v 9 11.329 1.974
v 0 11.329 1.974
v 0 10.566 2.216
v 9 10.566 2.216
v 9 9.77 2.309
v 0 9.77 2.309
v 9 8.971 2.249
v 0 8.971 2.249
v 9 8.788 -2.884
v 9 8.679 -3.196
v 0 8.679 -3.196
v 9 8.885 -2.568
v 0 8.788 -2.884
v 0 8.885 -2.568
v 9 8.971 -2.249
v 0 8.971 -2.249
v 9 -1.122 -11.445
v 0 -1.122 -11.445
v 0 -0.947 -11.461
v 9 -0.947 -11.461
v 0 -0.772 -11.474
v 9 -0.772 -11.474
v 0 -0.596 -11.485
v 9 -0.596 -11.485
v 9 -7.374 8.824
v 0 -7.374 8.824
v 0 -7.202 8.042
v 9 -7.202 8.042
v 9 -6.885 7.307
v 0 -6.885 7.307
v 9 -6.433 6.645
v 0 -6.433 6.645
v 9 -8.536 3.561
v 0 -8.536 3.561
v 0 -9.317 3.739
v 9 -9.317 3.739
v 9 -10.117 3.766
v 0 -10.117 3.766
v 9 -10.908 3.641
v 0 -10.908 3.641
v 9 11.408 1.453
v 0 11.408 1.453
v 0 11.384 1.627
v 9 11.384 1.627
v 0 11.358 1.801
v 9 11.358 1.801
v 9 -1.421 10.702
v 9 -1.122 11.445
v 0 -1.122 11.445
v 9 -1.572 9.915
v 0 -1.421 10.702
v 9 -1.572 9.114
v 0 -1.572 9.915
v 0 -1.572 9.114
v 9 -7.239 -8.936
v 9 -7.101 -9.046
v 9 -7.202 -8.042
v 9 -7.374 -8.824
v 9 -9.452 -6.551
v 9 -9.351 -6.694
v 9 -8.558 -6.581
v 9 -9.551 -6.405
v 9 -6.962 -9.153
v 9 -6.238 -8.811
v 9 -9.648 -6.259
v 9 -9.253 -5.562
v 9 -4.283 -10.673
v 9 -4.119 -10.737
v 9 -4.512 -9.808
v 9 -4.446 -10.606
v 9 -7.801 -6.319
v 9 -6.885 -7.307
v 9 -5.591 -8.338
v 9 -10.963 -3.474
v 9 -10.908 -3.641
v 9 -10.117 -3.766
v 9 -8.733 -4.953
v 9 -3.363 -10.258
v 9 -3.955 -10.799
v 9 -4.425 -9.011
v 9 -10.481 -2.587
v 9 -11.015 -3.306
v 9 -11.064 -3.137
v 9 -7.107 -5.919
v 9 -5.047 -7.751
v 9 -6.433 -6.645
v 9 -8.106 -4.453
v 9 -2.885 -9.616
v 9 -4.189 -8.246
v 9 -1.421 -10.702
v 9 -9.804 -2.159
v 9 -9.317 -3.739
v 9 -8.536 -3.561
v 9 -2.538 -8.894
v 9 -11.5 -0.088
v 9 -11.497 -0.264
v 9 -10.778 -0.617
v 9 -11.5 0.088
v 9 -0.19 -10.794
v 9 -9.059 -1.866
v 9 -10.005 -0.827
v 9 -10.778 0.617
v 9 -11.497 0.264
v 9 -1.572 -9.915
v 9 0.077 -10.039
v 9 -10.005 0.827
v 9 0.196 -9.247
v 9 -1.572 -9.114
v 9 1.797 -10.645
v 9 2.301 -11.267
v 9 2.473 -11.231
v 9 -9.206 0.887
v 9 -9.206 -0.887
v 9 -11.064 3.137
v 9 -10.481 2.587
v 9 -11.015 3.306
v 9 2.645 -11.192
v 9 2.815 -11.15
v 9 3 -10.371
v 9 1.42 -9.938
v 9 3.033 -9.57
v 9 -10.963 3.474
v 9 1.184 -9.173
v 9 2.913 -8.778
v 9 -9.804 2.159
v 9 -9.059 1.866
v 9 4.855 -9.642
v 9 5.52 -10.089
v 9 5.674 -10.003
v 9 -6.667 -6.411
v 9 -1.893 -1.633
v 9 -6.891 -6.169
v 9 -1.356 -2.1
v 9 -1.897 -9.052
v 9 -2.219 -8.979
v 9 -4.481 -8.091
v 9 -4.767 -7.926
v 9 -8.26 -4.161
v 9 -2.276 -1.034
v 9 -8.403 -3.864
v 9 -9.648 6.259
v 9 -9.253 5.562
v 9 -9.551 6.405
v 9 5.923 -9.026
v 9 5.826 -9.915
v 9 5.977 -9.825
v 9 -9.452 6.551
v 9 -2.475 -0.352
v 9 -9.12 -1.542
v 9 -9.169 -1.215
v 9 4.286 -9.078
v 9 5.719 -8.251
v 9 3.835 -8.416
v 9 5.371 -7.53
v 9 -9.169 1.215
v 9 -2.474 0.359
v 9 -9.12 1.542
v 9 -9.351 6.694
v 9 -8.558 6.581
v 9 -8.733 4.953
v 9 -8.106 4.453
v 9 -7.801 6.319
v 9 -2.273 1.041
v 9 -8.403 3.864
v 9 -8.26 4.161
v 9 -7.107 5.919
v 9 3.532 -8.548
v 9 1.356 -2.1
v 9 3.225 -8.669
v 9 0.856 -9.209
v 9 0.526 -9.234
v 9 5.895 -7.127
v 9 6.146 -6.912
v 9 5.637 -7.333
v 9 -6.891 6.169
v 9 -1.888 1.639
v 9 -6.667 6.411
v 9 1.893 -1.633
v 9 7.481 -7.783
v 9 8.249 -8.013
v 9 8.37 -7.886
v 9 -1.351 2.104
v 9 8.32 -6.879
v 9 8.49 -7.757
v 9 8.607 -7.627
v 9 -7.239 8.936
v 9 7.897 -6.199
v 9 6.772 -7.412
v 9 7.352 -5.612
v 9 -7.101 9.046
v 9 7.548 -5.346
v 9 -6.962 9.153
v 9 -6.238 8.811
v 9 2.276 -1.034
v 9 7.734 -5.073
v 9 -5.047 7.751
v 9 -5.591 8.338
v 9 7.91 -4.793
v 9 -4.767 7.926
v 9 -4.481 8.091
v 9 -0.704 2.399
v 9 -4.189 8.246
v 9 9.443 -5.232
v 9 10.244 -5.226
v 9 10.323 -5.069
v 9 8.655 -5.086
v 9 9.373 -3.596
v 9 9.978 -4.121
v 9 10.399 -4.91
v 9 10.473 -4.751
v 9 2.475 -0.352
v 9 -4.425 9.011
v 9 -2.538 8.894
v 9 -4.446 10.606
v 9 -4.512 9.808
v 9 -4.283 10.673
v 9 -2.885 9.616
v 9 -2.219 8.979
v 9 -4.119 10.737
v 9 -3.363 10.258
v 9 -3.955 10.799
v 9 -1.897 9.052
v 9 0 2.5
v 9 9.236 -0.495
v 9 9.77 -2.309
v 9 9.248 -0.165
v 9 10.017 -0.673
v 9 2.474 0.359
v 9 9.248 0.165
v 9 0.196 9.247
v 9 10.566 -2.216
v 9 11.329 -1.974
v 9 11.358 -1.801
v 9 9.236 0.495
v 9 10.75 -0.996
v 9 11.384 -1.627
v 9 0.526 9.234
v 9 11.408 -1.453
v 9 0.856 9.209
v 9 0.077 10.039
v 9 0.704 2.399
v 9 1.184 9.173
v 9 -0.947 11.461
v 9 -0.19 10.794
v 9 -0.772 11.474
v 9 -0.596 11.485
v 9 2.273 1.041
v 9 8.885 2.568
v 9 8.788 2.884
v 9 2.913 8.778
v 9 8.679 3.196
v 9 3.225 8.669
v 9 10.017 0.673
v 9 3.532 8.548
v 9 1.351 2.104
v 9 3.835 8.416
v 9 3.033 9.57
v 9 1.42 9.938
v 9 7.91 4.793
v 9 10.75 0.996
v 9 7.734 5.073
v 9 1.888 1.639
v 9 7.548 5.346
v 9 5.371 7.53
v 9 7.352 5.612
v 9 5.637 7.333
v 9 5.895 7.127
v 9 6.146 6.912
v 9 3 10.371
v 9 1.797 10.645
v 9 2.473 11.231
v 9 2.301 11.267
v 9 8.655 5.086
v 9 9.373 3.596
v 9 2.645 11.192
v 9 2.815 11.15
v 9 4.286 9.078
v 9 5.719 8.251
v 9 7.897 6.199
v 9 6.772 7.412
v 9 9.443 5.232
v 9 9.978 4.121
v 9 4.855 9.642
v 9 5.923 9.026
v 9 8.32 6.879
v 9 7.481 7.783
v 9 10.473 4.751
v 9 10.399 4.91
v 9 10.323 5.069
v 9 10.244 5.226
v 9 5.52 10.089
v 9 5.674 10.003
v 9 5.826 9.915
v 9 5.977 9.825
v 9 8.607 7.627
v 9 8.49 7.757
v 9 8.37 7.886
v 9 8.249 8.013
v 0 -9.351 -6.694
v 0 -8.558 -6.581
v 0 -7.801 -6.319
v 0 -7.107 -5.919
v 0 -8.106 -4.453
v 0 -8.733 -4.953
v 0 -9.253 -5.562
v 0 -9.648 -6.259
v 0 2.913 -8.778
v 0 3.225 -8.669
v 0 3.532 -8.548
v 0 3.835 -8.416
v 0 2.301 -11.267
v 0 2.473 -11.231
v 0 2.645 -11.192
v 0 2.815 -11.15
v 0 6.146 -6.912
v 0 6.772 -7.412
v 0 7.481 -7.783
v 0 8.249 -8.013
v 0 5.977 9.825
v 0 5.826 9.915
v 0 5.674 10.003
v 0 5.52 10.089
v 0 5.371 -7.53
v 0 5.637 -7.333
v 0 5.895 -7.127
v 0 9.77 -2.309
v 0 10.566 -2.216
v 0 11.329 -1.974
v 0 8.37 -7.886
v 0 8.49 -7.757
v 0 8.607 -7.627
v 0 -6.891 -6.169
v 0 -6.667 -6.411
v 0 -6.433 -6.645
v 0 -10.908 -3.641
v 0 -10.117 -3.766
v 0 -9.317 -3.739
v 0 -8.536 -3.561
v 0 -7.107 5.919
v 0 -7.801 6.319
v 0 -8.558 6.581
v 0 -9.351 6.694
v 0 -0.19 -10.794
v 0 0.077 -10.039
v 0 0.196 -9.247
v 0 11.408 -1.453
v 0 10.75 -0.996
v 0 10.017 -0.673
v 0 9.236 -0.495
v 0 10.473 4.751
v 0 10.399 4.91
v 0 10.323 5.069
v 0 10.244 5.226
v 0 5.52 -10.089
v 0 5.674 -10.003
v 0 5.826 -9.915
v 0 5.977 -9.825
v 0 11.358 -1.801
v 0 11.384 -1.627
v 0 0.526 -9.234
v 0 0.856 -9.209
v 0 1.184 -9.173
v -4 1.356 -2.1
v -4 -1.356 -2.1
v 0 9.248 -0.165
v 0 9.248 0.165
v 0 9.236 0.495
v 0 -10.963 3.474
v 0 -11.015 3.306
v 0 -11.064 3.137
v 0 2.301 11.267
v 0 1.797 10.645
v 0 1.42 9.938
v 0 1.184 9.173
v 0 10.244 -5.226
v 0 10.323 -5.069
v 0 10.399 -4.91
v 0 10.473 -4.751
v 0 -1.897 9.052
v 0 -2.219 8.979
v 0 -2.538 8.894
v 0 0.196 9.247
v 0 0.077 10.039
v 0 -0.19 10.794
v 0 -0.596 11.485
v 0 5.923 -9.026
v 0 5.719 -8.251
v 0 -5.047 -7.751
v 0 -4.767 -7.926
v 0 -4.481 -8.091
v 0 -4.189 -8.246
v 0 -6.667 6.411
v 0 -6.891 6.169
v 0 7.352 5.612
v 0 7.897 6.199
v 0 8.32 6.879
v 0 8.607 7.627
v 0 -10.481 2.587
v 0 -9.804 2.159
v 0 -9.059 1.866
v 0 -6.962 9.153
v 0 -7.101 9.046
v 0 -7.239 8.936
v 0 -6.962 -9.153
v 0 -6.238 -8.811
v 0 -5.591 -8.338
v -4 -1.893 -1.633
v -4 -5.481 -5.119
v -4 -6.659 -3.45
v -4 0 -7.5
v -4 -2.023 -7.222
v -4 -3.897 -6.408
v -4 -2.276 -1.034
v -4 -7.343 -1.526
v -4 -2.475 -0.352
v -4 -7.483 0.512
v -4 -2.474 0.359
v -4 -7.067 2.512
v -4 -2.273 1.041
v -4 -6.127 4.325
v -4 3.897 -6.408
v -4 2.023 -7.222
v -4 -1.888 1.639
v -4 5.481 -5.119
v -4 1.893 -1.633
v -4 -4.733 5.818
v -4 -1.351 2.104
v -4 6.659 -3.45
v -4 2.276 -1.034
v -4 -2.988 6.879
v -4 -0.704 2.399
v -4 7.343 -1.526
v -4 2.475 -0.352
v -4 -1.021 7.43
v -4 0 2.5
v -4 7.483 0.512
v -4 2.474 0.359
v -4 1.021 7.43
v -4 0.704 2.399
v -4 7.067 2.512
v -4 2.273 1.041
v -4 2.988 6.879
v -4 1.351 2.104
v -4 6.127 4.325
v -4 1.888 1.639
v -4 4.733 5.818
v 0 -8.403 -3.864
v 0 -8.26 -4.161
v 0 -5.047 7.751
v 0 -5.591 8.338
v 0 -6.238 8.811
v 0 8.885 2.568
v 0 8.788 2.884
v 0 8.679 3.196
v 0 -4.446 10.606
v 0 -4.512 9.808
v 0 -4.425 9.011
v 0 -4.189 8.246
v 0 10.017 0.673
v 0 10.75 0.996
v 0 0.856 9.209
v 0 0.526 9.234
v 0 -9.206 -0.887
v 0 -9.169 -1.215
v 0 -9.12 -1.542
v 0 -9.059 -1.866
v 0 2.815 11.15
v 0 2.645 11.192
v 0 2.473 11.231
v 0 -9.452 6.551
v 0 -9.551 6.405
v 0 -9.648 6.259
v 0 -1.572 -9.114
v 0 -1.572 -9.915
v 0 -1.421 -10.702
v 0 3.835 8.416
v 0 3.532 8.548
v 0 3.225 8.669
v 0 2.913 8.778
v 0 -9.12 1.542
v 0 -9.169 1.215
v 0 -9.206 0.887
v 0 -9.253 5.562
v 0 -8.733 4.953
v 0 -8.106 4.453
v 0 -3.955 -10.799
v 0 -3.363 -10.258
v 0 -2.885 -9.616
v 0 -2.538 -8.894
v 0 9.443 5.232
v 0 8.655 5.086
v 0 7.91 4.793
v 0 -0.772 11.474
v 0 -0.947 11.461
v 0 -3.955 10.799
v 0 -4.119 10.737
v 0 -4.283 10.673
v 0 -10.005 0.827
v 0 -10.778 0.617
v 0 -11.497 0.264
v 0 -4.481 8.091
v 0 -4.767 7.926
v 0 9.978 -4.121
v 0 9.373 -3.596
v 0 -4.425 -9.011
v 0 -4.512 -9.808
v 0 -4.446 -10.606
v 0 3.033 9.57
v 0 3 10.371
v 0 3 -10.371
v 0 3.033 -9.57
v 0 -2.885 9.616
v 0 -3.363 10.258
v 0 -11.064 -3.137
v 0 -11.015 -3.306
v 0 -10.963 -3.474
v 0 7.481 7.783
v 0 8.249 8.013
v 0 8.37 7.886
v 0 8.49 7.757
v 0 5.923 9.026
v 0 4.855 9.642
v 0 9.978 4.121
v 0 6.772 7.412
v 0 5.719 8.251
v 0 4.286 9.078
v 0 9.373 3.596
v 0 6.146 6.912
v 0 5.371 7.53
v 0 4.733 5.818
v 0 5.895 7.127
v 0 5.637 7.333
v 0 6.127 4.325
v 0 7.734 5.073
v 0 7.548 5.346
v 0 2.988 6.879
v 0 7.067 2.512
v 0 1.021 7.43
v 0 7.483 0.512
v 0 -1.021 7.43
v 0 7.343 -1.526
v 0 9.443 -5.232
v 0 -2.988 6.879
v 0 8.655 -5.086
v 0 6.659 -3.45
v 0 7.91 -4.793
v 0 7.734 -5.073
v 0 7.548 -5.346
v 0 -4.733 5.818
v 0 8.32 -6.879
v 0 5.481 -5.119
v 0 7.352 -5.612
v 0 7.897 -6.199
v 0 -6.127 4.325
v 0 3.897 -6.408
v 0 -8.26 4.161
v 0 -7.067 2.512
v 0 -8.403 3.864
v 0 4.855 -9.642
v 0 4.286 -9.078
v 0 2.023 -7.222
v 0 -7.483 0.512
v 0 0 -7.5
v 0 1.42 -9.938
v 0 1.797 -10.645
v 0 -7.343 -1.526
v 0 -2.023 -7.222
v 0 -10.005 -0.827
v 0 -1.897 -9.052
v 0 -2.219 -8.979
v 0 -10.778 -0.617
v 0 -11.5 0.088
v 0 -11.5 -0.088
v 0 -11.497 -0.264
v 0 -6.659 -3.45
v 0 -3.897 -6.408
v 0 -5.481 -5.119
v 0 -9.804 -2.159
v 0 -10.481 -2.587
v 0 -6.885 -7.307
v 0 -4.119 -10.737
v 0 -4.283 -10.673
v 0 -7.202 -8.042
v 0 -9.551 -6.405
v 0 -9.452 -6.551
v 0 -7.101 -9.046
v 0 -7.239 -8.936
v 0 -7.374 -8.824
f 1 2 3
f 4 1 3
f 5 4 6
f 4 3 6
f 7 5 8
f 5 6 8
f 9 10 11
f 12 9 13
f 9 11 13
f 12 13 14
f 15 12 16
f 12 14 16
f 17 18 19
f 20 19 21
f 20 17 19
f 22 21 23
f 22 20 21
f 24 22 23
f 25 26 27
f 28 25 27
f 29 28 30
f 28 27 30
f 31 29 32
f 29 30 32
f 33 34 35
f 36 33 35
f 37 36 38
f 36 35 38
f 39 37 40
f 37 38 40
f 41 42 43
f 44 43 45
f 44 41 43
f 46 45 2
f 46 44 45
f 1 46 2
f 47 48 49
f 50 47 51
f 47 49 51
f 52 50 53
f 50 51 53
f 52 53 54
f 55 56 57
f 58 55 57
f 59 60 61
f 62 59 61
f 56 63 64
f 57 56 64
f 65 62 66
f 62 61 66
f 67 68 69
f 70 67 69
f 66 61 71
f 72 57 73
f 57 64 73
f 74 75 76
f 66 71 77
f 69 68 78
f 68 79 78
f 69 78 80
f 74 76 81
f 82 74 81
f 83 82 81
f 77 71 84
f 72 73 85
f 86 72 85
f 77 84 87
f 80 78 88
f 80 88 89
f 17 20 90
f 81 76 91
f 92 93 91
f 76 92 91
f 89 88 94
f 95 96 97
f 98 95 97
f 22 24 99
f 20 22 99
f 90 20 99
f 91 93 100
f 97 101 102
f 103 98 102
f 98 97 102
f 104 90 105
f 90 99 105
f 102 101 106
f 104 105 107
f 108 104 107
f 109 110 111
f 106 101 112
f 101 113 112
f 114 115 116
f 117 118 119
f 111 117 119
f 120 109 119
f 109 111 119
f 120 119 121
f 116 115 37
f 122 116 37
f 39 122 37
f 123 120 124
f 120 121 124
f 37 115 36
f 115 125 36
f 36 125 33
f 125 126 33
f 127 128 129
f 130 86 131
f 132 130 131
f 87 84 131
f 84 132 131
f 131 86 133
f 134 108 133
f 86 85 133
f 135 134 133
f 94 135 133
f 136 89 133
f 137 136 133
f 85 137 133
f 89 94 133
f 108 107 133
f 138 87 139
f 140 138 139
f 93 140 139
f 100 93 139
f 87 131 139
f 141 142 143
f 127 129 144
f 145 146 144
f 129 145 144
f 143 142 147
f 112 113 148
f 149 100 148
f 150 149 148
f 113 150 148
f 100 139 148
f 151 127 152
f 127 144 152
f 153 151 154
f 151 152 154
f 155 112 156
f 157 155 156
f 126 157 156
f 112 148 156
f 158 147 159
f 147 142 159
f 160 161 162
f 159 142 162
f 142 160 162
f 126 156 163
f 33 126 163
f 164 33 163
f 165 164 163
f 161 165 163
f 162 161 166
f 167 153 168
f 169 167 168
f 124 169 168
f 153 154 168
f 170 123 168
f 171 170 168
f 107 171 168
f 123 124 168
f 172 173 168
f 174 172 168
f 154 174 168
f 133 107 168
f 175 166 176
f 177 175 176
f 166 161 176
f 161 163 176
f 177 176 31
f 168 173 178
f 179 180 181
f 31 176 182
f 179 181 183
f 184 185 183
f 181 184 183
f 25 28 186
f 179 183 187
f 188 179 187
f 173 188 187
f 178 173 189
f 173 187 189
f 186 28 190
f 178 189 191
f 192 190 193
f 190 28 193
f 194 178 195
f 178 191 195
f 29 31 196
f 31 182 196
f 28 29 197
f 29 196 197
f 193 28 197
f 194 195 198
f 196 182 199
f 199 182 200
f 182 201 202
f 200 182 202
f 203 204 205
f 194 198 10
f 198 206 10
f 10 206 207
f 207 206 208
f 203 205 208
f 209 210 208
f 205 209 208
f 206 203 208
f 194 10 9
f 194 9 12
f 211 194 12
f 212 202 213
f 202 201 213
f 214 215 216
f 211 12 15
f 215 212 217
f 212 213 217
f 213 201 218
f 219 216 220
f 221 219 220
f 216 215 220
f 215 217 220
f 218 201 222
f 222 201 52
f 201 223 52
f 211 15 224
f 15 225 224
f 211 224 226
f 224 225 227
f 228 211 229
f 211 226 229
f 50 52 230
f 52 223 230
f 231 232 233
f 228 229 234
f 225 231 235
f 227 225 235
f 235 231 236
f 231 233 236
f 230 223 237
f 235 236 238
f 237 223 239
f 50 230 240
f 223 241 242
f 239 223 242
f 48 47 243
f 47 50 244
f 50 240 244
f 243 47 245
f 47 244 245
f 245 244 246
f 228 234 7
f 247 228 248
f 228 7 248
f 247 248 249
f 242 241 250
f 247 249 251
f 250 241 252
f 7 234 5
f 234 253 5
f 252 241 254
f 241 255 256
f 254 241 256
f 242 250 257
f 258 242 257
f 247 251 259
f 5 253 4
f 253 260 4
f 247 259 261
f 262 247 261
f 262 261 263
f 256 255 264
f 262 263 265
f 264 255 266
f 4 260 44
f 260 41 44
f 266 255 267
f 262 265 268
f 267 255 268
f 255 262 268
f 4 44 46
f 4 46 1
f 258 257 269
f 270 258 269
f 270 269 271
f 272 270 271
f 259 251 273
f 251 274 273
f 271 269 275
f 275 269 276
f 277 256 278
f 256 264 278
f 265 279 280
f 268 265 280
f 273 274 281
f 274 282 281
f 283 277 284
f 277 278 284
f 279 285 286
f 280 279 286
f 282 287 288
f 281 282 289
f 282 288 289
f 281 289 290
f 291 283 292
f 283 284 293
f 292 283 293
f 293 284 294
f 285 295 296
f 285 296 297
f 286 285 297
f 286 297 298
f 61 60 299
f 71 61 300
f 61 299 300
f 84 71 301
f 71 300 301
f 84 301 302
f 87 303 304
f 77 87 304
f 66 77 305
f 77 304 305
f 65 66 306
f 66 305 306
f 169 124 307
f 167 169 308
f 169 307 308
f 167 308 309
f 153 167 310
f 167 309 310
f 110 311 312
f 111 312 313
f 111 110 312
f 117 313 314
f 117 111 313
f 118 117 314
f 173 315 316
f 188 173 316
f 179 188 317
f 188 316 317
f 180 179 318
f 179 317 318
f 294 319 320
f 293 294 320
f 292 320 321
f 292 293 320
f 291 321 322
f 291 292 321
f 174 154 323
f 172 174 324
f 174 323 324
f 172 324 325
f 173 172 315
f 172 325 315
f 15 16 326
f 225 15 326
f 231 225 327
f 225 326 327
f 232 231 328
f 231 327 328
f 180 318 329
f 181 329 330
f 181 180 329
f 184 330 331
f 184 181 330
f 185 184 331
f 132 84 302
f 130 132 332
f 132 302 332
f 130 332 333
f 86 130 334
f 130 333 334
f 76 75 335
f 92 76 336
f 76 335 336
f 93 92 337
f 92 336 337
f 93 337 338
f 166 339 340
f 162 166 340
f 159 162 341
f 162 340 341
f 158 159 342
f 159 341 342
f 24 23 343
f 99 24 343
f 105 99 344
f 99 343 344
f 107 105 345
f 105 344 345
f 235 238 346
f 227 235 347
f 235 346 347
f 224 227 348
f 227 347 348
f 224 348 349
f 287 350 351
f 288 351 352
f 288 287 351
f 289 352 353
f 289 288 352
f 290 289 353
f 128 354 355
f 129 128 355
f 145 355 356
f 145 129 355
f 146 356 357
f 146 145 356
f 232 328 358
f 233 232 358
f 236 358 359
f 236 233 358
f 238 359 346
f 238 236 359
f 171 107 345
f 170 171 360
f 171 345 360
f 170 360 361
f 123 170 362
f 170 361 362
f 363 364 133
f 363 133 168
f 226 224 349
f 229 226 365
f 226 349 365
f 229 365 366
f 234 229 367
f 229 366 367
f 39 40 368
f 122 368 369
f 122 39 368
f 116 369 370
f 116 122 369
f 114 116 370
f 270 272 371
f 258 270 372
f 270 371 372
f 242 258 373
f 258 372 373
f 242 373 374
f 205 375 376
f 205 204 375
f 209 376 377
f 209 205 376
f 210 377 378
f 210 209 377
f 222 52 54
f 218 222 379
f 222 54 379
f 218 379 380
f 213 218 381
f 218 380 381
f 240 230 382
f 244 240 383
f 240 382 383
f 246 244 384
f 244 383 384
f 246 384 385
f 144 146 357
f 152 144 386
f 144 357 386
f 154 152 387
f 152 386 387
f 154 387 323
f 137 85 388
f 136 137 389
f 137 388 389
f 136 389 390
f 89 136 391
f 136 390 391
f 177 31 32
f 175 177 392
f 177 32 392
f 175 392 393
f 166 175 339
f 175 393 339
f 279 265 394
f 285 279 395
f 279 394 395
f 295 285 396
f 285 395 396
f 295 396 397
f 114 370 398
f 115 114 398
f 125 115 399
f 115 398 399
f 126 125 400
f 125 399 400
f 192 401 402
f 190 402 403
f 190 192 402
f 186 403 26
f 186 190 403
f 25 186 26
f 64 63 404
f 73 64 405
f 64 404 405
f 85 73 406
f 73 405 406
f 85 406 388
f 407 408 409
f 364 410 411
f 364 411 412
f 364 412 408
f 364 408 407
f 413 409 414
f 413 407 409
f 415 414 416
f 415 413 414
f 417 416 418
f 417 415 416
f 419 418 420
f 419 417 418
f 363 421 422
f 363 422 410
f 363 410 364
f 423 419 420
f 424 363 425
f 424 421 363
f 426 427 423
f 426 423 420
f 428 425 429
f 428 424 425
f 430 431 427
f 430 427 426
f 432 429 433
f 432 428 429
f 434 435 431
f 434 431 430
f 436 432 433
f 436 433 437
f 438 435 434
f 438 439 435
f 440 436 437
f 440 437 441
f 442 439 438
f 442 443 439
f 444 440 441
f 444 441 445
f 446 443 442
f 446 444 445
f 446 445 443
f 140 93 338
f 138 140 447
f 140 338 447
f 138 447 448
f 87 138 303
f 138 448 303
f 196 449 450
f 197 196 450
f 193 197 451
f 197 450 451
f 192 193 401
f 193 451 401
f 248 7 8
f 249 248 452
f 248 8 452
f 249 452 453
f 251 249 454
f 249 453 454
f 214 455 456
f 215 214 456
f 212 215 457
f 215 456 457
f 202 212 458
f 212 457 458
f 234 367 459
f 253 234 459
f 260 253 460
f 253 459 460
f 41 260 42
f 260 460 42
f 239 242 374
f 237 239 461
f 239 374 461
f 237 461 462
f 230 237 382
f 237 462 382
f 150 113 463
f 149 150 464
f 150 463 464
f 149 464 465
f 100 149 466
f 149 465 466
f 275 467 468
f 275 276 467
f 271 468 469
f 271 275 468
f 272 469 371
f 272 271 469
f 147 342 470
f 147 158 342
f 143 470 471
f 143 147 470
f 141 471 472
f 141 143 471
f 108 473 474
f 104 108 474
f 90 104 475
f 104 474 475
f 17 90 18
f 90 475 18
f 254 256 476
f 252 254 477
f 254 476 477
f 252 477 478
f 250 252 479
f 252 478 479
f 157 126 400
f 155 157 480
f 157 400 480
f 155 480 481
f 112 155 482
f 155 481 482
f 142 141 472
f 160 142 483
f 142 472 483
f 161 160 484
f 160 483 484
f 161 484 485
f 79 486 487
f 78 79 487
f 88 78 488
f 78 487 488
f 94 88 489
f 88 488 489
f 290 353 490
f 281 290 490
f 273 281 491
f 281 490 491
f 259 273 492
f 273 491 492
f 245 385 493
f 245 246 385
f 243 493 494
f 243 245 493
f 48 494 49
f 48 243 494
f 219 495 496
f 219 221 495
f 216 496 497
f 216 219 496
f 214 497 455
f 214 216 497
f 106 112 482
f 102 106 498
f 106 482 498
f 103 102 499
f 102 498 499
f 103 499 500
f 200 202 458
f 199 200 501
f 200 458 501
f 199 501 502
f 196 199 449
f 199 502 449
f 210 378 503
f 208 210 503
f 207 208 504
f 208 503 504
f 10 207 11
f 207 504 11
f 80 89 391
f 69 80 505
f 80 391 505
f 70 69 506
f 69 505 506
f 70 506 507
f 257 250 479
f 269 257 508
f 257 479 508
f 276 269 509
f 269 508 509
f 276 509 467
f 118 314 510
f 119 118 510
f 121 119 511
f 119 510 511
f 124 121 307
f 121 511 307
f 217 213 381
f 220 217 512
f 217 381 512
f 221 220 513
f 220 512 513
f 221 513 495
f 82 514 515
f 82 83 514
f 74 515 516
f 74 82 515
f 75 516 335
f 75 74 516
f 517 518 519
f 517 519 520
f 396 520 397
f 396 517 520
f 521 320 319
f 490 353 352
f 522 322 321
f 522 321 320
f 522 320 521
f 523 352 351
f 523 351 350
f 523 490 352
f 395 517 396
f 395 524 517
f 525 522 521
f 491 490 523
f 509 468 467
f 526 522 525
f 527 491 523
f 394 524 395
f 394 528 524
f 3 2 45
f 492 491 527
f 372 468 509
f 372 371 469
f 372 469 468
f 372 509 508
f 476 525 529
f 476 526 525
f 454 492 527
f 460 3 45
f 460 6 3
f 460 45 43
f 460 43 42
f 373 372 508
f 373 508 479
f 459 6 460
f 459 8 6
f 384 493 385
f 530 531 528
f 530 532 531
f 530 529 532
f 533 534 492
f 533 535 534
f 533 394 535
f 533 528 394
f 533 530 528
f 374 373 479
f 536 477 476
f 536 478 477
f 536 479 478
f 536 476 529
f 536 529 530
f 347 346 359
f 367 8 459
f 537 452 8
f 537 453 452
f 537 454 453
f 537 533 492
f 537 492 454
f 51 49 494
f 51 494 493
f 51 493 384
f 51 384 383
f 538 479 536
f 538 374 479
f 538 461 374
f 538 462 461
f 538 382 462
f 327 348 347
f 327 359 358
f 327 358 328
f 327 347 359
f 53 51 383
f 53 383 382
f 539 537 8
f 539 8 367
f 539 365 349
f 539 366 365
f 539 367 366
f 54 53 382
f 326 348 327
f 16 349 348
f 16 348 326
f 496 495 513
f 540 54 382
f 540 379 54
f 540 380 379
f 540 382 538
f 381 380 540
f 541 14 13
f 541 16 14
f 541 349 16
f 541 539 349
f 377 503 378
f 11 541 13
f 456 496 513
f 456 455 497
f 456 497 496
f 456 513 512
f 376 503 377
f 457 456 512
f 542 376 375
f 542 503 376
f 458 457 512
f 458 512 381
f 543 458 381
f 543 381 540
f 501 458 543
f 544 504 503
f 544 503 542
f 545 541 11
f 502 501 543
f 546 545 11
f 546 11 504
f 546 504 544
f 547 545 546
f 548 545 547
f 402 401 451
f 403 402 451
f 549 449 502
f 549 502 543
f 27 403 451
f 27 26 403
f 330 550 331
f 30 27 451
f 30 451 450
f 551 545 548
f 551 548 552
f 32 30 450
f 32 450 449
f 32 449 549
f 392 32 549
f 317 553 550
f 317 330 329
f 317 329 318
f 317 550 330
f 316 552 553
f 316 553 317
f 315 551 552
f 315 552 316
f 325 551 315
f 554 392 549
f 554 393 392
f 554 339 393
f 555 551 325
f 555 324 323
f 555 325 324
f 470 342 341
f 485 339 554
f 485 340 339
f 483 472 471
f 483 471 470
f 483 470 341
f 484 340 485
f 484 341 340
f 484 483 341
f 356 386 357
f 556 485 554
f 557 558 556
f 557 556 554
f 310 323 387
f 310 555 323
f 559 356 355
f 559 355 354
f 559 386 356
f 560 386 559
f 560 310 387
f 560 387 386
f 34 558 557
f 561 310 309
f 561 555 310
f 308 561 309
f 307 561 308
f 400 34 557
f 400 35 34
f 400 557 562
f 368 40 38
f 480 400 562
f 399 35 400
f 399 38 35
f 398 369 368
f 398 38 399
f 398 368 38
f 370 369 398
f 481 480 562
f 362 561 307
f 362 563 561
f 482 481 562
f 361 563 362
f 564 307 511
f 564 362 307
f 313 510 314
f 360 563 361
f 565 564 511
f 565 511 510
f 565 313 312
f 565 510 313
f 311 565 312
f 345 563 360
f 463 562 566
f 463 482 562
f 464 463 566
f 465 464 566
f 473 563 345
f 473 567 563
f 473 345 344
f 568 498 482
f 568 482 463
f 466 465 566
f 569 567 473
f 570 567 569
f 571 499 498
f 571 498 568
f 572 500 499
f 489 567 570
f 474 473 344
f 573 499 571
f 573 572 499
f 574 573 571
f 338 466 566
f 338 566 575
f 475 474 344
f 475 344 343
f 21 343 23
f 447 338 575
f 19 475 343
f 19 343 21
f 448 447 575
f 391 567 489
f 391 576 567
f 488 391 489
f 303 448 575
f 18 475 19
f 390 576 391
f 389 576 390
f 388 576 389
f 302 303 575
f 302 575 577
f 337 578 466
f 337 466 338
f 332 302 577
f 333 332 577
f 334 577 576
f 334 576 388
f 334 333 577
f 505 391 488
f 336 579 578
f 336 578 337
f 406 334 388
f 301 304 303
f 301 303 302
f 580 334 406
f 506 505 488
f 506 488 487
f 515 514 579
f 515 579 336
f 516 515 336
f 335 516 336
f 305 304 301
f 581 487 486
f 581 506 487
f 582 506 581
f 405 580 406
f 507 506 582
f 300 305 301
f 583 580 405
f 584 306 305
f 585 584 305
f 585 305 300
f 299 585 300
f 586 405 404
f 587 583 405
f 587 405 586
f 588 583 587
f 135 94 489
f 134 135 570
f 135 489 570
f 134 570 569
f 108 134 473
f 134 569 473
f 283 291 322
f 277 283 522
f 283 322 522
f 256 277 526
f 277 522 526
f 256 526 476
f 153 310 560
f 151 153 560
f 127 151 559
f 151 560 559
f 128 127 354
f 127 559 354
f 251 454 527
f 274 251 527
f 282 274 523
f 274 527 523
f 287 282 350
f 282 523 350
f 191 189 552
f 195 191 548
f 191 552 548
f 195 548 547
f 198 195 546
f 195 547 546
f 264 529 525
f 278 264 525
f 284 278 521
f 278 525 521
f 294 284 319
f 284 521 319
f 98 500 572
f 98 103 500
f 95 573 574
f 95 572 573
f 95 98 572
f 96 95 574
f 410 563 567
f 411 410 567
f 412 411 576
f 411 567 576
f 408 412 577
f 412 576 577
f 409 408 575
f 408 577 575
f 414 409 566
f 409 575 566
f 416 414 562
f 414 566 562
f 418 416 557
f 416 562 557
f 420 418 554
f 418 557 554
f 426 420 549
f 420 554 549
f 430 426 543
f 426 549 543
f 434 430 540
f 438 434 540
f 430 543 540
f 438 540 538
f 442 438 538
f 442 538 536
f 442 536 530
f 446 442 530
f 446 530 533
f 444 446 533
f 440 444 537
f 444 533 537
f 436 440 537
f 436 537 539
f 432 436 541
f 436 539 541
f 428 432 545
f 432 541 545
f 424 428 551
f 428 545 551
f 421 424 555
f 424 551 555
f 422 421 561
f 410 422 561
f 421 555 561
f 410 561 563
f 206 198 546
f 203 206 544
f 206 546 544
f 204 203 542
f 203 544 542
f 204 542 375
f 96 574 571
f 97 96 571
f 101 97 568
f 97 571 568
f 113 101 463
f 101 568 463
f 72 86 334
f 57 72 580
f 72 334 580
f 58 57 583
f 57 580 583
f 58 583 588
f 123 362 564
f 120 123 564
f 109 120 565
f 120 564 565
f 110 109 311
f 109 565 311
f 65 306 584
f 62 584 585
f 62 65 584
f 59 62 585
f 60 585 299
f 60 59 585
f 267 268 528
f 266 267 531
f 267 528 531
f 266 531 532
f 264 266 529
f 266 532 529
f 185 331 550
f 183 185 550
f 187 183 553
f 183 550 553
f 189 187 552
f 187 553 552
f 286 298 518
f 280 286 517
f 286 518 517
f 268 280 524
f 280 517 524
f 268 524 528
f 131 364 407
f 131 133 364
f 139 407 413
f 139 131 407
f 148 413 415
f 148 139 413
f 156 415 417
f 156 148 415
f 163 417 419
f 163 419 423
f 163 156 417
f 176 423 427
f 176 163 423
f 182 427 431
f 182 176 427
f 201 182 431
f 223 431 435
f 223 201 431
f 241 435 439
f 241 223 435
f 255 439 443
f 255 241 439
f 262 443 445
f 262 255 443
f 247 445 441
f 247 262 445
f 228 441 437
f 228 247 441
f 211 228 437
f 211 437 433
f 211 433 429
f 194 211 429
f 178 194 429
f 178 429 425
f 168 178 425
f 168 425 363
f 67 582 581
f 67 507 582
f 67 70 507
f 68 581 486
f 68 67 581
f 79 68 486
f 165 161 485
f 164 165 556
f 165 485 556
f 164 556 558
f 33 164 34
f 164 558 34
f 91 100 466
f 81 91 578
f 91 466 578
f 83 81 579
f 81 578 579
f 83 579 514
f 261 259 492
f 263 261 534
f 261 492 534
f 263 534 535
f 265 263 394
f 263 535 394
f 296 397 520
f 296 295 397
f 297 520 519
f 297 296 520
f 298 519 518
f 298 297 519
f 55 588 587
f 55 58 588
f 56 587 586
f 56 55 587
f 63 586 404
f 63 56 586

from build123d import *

# Parameters (mm, degrees)
BASPROSKE_W         = 9
BASPROSKE_H         = 11.5
TOOTHCUT_DEPTH      = 19.587630295
TEETHCUTS_COUNT     = 21
TEETHCUTS_ANGLE     = 342.857142857
BORSKE_R            = 2.5
BORE_DEPTH          = 50.0000508
SKETCH1_R           = 7.5
SKETCH1_R_2         = 2.5
BOSS_EXTRUDE1_DEPTH = 4
BOSS_EXTRUDE2_DEPTH = 13


with BuildPart() as part:
    # BasProSke → Base-Revolve (revolve)
    with BuildSketch(Plane(origin=(0, 0, 0), x_dir=(1, 0, 0), z_dir=(0, 1, 0)), mode=Mode.PRIVATE) as base_revolve_sk:
        with Locations((4.5, 5.75)):
            Rectangle(BASPROSKE_W, BASPROSKE_H)
    revolve(base_revolve_sk.sketch.rotate(Axis((-10, 0, 0), (1, 0, 0)), 180), axis=Axis((-10, 0, 0), (1, 0, 0)))

    # TooCutSke → ToothCut (cut, through all)
    with BuildSketch(Plane(origin=(0, 0, 0), x_dir=(0, 0, -1), z_dir=(1, 0, 0))):
        with BuildLine():
            ThreePointArc((0.49526894, 9.235730057), (0, 9.249), (-0.49526894, 9.235730057))
            ThreePointArc((-0.49526894, 9.235730057), (-0.823521057, 10.404716786), (-1.472455249, 11.430954496))
            ThreePointArc((-1.472455249, 11.430954496), (0, 11.5254), (1.472455249, 11.430954496))
            ThreePointArc((1.472455249, 11.430954496), (0.823521057, 10.404716786), (0.49526894, 9.235730057))
        make_face()
    toothcut = extrude(amount=TOOTHCUT_DEPTH, mode=Mode.SUBTRACT)

    # TeethCuts: ToothCut ×21 about axis
    teethcuts_axis = Axis((-10, 0, 0), (1, 0, 0))
    for i in range(1, TEETHCUTS_COUNT):
        add(toothcut.rotate(teethcuts_axis, i * TEETHCUTS_ANGLE / (TEETHCUTS_COUNT - 1)), mode=Mode.SUBTRACT)

    # BorSke → Bore (cut, symmetric)
    with BuildSketch(Plane(origin=(0, 0, 0), x_dir=(0, 0, -1), z_dir=(1, 0, 0))):
        with Locations(Location((0, 0, 0), (0, 0, 180))):
            Circle(BORSKE_R)
    extrude(amount=BORE_DEPTH, both=True, mode=Mode.SUBTRACT)

    # Sketch1 → Boss-Extrude1 (add)
    with BuildSketch(Plane.ZY):
        with Locations(Location((0, 0, 0), (0, 0, 180))):
            Circle(SKETCH1_R)
        Circle(SKETCH1_R_2, mode=Mode.SUBTRACT)
    extrude(amount=BOSS_EXTRUDE1_DEPTH)

    # Sketch2 → Boss-Extrude2 (add, through all)
    with BuildSketch(Plane.ZY.offset(4)):
        with BuildLine():
            Line((-2.1, -1.356465997), (-2.1, 1.356465997))
            ThreePointArc((-2.1, 1.356465997), (-2.5, 0), (-2.1, -1.356465997))
        make_face()
    extrude(amount=-BOSS_EXTRUDE2_DEPTH)


solid = part.part
